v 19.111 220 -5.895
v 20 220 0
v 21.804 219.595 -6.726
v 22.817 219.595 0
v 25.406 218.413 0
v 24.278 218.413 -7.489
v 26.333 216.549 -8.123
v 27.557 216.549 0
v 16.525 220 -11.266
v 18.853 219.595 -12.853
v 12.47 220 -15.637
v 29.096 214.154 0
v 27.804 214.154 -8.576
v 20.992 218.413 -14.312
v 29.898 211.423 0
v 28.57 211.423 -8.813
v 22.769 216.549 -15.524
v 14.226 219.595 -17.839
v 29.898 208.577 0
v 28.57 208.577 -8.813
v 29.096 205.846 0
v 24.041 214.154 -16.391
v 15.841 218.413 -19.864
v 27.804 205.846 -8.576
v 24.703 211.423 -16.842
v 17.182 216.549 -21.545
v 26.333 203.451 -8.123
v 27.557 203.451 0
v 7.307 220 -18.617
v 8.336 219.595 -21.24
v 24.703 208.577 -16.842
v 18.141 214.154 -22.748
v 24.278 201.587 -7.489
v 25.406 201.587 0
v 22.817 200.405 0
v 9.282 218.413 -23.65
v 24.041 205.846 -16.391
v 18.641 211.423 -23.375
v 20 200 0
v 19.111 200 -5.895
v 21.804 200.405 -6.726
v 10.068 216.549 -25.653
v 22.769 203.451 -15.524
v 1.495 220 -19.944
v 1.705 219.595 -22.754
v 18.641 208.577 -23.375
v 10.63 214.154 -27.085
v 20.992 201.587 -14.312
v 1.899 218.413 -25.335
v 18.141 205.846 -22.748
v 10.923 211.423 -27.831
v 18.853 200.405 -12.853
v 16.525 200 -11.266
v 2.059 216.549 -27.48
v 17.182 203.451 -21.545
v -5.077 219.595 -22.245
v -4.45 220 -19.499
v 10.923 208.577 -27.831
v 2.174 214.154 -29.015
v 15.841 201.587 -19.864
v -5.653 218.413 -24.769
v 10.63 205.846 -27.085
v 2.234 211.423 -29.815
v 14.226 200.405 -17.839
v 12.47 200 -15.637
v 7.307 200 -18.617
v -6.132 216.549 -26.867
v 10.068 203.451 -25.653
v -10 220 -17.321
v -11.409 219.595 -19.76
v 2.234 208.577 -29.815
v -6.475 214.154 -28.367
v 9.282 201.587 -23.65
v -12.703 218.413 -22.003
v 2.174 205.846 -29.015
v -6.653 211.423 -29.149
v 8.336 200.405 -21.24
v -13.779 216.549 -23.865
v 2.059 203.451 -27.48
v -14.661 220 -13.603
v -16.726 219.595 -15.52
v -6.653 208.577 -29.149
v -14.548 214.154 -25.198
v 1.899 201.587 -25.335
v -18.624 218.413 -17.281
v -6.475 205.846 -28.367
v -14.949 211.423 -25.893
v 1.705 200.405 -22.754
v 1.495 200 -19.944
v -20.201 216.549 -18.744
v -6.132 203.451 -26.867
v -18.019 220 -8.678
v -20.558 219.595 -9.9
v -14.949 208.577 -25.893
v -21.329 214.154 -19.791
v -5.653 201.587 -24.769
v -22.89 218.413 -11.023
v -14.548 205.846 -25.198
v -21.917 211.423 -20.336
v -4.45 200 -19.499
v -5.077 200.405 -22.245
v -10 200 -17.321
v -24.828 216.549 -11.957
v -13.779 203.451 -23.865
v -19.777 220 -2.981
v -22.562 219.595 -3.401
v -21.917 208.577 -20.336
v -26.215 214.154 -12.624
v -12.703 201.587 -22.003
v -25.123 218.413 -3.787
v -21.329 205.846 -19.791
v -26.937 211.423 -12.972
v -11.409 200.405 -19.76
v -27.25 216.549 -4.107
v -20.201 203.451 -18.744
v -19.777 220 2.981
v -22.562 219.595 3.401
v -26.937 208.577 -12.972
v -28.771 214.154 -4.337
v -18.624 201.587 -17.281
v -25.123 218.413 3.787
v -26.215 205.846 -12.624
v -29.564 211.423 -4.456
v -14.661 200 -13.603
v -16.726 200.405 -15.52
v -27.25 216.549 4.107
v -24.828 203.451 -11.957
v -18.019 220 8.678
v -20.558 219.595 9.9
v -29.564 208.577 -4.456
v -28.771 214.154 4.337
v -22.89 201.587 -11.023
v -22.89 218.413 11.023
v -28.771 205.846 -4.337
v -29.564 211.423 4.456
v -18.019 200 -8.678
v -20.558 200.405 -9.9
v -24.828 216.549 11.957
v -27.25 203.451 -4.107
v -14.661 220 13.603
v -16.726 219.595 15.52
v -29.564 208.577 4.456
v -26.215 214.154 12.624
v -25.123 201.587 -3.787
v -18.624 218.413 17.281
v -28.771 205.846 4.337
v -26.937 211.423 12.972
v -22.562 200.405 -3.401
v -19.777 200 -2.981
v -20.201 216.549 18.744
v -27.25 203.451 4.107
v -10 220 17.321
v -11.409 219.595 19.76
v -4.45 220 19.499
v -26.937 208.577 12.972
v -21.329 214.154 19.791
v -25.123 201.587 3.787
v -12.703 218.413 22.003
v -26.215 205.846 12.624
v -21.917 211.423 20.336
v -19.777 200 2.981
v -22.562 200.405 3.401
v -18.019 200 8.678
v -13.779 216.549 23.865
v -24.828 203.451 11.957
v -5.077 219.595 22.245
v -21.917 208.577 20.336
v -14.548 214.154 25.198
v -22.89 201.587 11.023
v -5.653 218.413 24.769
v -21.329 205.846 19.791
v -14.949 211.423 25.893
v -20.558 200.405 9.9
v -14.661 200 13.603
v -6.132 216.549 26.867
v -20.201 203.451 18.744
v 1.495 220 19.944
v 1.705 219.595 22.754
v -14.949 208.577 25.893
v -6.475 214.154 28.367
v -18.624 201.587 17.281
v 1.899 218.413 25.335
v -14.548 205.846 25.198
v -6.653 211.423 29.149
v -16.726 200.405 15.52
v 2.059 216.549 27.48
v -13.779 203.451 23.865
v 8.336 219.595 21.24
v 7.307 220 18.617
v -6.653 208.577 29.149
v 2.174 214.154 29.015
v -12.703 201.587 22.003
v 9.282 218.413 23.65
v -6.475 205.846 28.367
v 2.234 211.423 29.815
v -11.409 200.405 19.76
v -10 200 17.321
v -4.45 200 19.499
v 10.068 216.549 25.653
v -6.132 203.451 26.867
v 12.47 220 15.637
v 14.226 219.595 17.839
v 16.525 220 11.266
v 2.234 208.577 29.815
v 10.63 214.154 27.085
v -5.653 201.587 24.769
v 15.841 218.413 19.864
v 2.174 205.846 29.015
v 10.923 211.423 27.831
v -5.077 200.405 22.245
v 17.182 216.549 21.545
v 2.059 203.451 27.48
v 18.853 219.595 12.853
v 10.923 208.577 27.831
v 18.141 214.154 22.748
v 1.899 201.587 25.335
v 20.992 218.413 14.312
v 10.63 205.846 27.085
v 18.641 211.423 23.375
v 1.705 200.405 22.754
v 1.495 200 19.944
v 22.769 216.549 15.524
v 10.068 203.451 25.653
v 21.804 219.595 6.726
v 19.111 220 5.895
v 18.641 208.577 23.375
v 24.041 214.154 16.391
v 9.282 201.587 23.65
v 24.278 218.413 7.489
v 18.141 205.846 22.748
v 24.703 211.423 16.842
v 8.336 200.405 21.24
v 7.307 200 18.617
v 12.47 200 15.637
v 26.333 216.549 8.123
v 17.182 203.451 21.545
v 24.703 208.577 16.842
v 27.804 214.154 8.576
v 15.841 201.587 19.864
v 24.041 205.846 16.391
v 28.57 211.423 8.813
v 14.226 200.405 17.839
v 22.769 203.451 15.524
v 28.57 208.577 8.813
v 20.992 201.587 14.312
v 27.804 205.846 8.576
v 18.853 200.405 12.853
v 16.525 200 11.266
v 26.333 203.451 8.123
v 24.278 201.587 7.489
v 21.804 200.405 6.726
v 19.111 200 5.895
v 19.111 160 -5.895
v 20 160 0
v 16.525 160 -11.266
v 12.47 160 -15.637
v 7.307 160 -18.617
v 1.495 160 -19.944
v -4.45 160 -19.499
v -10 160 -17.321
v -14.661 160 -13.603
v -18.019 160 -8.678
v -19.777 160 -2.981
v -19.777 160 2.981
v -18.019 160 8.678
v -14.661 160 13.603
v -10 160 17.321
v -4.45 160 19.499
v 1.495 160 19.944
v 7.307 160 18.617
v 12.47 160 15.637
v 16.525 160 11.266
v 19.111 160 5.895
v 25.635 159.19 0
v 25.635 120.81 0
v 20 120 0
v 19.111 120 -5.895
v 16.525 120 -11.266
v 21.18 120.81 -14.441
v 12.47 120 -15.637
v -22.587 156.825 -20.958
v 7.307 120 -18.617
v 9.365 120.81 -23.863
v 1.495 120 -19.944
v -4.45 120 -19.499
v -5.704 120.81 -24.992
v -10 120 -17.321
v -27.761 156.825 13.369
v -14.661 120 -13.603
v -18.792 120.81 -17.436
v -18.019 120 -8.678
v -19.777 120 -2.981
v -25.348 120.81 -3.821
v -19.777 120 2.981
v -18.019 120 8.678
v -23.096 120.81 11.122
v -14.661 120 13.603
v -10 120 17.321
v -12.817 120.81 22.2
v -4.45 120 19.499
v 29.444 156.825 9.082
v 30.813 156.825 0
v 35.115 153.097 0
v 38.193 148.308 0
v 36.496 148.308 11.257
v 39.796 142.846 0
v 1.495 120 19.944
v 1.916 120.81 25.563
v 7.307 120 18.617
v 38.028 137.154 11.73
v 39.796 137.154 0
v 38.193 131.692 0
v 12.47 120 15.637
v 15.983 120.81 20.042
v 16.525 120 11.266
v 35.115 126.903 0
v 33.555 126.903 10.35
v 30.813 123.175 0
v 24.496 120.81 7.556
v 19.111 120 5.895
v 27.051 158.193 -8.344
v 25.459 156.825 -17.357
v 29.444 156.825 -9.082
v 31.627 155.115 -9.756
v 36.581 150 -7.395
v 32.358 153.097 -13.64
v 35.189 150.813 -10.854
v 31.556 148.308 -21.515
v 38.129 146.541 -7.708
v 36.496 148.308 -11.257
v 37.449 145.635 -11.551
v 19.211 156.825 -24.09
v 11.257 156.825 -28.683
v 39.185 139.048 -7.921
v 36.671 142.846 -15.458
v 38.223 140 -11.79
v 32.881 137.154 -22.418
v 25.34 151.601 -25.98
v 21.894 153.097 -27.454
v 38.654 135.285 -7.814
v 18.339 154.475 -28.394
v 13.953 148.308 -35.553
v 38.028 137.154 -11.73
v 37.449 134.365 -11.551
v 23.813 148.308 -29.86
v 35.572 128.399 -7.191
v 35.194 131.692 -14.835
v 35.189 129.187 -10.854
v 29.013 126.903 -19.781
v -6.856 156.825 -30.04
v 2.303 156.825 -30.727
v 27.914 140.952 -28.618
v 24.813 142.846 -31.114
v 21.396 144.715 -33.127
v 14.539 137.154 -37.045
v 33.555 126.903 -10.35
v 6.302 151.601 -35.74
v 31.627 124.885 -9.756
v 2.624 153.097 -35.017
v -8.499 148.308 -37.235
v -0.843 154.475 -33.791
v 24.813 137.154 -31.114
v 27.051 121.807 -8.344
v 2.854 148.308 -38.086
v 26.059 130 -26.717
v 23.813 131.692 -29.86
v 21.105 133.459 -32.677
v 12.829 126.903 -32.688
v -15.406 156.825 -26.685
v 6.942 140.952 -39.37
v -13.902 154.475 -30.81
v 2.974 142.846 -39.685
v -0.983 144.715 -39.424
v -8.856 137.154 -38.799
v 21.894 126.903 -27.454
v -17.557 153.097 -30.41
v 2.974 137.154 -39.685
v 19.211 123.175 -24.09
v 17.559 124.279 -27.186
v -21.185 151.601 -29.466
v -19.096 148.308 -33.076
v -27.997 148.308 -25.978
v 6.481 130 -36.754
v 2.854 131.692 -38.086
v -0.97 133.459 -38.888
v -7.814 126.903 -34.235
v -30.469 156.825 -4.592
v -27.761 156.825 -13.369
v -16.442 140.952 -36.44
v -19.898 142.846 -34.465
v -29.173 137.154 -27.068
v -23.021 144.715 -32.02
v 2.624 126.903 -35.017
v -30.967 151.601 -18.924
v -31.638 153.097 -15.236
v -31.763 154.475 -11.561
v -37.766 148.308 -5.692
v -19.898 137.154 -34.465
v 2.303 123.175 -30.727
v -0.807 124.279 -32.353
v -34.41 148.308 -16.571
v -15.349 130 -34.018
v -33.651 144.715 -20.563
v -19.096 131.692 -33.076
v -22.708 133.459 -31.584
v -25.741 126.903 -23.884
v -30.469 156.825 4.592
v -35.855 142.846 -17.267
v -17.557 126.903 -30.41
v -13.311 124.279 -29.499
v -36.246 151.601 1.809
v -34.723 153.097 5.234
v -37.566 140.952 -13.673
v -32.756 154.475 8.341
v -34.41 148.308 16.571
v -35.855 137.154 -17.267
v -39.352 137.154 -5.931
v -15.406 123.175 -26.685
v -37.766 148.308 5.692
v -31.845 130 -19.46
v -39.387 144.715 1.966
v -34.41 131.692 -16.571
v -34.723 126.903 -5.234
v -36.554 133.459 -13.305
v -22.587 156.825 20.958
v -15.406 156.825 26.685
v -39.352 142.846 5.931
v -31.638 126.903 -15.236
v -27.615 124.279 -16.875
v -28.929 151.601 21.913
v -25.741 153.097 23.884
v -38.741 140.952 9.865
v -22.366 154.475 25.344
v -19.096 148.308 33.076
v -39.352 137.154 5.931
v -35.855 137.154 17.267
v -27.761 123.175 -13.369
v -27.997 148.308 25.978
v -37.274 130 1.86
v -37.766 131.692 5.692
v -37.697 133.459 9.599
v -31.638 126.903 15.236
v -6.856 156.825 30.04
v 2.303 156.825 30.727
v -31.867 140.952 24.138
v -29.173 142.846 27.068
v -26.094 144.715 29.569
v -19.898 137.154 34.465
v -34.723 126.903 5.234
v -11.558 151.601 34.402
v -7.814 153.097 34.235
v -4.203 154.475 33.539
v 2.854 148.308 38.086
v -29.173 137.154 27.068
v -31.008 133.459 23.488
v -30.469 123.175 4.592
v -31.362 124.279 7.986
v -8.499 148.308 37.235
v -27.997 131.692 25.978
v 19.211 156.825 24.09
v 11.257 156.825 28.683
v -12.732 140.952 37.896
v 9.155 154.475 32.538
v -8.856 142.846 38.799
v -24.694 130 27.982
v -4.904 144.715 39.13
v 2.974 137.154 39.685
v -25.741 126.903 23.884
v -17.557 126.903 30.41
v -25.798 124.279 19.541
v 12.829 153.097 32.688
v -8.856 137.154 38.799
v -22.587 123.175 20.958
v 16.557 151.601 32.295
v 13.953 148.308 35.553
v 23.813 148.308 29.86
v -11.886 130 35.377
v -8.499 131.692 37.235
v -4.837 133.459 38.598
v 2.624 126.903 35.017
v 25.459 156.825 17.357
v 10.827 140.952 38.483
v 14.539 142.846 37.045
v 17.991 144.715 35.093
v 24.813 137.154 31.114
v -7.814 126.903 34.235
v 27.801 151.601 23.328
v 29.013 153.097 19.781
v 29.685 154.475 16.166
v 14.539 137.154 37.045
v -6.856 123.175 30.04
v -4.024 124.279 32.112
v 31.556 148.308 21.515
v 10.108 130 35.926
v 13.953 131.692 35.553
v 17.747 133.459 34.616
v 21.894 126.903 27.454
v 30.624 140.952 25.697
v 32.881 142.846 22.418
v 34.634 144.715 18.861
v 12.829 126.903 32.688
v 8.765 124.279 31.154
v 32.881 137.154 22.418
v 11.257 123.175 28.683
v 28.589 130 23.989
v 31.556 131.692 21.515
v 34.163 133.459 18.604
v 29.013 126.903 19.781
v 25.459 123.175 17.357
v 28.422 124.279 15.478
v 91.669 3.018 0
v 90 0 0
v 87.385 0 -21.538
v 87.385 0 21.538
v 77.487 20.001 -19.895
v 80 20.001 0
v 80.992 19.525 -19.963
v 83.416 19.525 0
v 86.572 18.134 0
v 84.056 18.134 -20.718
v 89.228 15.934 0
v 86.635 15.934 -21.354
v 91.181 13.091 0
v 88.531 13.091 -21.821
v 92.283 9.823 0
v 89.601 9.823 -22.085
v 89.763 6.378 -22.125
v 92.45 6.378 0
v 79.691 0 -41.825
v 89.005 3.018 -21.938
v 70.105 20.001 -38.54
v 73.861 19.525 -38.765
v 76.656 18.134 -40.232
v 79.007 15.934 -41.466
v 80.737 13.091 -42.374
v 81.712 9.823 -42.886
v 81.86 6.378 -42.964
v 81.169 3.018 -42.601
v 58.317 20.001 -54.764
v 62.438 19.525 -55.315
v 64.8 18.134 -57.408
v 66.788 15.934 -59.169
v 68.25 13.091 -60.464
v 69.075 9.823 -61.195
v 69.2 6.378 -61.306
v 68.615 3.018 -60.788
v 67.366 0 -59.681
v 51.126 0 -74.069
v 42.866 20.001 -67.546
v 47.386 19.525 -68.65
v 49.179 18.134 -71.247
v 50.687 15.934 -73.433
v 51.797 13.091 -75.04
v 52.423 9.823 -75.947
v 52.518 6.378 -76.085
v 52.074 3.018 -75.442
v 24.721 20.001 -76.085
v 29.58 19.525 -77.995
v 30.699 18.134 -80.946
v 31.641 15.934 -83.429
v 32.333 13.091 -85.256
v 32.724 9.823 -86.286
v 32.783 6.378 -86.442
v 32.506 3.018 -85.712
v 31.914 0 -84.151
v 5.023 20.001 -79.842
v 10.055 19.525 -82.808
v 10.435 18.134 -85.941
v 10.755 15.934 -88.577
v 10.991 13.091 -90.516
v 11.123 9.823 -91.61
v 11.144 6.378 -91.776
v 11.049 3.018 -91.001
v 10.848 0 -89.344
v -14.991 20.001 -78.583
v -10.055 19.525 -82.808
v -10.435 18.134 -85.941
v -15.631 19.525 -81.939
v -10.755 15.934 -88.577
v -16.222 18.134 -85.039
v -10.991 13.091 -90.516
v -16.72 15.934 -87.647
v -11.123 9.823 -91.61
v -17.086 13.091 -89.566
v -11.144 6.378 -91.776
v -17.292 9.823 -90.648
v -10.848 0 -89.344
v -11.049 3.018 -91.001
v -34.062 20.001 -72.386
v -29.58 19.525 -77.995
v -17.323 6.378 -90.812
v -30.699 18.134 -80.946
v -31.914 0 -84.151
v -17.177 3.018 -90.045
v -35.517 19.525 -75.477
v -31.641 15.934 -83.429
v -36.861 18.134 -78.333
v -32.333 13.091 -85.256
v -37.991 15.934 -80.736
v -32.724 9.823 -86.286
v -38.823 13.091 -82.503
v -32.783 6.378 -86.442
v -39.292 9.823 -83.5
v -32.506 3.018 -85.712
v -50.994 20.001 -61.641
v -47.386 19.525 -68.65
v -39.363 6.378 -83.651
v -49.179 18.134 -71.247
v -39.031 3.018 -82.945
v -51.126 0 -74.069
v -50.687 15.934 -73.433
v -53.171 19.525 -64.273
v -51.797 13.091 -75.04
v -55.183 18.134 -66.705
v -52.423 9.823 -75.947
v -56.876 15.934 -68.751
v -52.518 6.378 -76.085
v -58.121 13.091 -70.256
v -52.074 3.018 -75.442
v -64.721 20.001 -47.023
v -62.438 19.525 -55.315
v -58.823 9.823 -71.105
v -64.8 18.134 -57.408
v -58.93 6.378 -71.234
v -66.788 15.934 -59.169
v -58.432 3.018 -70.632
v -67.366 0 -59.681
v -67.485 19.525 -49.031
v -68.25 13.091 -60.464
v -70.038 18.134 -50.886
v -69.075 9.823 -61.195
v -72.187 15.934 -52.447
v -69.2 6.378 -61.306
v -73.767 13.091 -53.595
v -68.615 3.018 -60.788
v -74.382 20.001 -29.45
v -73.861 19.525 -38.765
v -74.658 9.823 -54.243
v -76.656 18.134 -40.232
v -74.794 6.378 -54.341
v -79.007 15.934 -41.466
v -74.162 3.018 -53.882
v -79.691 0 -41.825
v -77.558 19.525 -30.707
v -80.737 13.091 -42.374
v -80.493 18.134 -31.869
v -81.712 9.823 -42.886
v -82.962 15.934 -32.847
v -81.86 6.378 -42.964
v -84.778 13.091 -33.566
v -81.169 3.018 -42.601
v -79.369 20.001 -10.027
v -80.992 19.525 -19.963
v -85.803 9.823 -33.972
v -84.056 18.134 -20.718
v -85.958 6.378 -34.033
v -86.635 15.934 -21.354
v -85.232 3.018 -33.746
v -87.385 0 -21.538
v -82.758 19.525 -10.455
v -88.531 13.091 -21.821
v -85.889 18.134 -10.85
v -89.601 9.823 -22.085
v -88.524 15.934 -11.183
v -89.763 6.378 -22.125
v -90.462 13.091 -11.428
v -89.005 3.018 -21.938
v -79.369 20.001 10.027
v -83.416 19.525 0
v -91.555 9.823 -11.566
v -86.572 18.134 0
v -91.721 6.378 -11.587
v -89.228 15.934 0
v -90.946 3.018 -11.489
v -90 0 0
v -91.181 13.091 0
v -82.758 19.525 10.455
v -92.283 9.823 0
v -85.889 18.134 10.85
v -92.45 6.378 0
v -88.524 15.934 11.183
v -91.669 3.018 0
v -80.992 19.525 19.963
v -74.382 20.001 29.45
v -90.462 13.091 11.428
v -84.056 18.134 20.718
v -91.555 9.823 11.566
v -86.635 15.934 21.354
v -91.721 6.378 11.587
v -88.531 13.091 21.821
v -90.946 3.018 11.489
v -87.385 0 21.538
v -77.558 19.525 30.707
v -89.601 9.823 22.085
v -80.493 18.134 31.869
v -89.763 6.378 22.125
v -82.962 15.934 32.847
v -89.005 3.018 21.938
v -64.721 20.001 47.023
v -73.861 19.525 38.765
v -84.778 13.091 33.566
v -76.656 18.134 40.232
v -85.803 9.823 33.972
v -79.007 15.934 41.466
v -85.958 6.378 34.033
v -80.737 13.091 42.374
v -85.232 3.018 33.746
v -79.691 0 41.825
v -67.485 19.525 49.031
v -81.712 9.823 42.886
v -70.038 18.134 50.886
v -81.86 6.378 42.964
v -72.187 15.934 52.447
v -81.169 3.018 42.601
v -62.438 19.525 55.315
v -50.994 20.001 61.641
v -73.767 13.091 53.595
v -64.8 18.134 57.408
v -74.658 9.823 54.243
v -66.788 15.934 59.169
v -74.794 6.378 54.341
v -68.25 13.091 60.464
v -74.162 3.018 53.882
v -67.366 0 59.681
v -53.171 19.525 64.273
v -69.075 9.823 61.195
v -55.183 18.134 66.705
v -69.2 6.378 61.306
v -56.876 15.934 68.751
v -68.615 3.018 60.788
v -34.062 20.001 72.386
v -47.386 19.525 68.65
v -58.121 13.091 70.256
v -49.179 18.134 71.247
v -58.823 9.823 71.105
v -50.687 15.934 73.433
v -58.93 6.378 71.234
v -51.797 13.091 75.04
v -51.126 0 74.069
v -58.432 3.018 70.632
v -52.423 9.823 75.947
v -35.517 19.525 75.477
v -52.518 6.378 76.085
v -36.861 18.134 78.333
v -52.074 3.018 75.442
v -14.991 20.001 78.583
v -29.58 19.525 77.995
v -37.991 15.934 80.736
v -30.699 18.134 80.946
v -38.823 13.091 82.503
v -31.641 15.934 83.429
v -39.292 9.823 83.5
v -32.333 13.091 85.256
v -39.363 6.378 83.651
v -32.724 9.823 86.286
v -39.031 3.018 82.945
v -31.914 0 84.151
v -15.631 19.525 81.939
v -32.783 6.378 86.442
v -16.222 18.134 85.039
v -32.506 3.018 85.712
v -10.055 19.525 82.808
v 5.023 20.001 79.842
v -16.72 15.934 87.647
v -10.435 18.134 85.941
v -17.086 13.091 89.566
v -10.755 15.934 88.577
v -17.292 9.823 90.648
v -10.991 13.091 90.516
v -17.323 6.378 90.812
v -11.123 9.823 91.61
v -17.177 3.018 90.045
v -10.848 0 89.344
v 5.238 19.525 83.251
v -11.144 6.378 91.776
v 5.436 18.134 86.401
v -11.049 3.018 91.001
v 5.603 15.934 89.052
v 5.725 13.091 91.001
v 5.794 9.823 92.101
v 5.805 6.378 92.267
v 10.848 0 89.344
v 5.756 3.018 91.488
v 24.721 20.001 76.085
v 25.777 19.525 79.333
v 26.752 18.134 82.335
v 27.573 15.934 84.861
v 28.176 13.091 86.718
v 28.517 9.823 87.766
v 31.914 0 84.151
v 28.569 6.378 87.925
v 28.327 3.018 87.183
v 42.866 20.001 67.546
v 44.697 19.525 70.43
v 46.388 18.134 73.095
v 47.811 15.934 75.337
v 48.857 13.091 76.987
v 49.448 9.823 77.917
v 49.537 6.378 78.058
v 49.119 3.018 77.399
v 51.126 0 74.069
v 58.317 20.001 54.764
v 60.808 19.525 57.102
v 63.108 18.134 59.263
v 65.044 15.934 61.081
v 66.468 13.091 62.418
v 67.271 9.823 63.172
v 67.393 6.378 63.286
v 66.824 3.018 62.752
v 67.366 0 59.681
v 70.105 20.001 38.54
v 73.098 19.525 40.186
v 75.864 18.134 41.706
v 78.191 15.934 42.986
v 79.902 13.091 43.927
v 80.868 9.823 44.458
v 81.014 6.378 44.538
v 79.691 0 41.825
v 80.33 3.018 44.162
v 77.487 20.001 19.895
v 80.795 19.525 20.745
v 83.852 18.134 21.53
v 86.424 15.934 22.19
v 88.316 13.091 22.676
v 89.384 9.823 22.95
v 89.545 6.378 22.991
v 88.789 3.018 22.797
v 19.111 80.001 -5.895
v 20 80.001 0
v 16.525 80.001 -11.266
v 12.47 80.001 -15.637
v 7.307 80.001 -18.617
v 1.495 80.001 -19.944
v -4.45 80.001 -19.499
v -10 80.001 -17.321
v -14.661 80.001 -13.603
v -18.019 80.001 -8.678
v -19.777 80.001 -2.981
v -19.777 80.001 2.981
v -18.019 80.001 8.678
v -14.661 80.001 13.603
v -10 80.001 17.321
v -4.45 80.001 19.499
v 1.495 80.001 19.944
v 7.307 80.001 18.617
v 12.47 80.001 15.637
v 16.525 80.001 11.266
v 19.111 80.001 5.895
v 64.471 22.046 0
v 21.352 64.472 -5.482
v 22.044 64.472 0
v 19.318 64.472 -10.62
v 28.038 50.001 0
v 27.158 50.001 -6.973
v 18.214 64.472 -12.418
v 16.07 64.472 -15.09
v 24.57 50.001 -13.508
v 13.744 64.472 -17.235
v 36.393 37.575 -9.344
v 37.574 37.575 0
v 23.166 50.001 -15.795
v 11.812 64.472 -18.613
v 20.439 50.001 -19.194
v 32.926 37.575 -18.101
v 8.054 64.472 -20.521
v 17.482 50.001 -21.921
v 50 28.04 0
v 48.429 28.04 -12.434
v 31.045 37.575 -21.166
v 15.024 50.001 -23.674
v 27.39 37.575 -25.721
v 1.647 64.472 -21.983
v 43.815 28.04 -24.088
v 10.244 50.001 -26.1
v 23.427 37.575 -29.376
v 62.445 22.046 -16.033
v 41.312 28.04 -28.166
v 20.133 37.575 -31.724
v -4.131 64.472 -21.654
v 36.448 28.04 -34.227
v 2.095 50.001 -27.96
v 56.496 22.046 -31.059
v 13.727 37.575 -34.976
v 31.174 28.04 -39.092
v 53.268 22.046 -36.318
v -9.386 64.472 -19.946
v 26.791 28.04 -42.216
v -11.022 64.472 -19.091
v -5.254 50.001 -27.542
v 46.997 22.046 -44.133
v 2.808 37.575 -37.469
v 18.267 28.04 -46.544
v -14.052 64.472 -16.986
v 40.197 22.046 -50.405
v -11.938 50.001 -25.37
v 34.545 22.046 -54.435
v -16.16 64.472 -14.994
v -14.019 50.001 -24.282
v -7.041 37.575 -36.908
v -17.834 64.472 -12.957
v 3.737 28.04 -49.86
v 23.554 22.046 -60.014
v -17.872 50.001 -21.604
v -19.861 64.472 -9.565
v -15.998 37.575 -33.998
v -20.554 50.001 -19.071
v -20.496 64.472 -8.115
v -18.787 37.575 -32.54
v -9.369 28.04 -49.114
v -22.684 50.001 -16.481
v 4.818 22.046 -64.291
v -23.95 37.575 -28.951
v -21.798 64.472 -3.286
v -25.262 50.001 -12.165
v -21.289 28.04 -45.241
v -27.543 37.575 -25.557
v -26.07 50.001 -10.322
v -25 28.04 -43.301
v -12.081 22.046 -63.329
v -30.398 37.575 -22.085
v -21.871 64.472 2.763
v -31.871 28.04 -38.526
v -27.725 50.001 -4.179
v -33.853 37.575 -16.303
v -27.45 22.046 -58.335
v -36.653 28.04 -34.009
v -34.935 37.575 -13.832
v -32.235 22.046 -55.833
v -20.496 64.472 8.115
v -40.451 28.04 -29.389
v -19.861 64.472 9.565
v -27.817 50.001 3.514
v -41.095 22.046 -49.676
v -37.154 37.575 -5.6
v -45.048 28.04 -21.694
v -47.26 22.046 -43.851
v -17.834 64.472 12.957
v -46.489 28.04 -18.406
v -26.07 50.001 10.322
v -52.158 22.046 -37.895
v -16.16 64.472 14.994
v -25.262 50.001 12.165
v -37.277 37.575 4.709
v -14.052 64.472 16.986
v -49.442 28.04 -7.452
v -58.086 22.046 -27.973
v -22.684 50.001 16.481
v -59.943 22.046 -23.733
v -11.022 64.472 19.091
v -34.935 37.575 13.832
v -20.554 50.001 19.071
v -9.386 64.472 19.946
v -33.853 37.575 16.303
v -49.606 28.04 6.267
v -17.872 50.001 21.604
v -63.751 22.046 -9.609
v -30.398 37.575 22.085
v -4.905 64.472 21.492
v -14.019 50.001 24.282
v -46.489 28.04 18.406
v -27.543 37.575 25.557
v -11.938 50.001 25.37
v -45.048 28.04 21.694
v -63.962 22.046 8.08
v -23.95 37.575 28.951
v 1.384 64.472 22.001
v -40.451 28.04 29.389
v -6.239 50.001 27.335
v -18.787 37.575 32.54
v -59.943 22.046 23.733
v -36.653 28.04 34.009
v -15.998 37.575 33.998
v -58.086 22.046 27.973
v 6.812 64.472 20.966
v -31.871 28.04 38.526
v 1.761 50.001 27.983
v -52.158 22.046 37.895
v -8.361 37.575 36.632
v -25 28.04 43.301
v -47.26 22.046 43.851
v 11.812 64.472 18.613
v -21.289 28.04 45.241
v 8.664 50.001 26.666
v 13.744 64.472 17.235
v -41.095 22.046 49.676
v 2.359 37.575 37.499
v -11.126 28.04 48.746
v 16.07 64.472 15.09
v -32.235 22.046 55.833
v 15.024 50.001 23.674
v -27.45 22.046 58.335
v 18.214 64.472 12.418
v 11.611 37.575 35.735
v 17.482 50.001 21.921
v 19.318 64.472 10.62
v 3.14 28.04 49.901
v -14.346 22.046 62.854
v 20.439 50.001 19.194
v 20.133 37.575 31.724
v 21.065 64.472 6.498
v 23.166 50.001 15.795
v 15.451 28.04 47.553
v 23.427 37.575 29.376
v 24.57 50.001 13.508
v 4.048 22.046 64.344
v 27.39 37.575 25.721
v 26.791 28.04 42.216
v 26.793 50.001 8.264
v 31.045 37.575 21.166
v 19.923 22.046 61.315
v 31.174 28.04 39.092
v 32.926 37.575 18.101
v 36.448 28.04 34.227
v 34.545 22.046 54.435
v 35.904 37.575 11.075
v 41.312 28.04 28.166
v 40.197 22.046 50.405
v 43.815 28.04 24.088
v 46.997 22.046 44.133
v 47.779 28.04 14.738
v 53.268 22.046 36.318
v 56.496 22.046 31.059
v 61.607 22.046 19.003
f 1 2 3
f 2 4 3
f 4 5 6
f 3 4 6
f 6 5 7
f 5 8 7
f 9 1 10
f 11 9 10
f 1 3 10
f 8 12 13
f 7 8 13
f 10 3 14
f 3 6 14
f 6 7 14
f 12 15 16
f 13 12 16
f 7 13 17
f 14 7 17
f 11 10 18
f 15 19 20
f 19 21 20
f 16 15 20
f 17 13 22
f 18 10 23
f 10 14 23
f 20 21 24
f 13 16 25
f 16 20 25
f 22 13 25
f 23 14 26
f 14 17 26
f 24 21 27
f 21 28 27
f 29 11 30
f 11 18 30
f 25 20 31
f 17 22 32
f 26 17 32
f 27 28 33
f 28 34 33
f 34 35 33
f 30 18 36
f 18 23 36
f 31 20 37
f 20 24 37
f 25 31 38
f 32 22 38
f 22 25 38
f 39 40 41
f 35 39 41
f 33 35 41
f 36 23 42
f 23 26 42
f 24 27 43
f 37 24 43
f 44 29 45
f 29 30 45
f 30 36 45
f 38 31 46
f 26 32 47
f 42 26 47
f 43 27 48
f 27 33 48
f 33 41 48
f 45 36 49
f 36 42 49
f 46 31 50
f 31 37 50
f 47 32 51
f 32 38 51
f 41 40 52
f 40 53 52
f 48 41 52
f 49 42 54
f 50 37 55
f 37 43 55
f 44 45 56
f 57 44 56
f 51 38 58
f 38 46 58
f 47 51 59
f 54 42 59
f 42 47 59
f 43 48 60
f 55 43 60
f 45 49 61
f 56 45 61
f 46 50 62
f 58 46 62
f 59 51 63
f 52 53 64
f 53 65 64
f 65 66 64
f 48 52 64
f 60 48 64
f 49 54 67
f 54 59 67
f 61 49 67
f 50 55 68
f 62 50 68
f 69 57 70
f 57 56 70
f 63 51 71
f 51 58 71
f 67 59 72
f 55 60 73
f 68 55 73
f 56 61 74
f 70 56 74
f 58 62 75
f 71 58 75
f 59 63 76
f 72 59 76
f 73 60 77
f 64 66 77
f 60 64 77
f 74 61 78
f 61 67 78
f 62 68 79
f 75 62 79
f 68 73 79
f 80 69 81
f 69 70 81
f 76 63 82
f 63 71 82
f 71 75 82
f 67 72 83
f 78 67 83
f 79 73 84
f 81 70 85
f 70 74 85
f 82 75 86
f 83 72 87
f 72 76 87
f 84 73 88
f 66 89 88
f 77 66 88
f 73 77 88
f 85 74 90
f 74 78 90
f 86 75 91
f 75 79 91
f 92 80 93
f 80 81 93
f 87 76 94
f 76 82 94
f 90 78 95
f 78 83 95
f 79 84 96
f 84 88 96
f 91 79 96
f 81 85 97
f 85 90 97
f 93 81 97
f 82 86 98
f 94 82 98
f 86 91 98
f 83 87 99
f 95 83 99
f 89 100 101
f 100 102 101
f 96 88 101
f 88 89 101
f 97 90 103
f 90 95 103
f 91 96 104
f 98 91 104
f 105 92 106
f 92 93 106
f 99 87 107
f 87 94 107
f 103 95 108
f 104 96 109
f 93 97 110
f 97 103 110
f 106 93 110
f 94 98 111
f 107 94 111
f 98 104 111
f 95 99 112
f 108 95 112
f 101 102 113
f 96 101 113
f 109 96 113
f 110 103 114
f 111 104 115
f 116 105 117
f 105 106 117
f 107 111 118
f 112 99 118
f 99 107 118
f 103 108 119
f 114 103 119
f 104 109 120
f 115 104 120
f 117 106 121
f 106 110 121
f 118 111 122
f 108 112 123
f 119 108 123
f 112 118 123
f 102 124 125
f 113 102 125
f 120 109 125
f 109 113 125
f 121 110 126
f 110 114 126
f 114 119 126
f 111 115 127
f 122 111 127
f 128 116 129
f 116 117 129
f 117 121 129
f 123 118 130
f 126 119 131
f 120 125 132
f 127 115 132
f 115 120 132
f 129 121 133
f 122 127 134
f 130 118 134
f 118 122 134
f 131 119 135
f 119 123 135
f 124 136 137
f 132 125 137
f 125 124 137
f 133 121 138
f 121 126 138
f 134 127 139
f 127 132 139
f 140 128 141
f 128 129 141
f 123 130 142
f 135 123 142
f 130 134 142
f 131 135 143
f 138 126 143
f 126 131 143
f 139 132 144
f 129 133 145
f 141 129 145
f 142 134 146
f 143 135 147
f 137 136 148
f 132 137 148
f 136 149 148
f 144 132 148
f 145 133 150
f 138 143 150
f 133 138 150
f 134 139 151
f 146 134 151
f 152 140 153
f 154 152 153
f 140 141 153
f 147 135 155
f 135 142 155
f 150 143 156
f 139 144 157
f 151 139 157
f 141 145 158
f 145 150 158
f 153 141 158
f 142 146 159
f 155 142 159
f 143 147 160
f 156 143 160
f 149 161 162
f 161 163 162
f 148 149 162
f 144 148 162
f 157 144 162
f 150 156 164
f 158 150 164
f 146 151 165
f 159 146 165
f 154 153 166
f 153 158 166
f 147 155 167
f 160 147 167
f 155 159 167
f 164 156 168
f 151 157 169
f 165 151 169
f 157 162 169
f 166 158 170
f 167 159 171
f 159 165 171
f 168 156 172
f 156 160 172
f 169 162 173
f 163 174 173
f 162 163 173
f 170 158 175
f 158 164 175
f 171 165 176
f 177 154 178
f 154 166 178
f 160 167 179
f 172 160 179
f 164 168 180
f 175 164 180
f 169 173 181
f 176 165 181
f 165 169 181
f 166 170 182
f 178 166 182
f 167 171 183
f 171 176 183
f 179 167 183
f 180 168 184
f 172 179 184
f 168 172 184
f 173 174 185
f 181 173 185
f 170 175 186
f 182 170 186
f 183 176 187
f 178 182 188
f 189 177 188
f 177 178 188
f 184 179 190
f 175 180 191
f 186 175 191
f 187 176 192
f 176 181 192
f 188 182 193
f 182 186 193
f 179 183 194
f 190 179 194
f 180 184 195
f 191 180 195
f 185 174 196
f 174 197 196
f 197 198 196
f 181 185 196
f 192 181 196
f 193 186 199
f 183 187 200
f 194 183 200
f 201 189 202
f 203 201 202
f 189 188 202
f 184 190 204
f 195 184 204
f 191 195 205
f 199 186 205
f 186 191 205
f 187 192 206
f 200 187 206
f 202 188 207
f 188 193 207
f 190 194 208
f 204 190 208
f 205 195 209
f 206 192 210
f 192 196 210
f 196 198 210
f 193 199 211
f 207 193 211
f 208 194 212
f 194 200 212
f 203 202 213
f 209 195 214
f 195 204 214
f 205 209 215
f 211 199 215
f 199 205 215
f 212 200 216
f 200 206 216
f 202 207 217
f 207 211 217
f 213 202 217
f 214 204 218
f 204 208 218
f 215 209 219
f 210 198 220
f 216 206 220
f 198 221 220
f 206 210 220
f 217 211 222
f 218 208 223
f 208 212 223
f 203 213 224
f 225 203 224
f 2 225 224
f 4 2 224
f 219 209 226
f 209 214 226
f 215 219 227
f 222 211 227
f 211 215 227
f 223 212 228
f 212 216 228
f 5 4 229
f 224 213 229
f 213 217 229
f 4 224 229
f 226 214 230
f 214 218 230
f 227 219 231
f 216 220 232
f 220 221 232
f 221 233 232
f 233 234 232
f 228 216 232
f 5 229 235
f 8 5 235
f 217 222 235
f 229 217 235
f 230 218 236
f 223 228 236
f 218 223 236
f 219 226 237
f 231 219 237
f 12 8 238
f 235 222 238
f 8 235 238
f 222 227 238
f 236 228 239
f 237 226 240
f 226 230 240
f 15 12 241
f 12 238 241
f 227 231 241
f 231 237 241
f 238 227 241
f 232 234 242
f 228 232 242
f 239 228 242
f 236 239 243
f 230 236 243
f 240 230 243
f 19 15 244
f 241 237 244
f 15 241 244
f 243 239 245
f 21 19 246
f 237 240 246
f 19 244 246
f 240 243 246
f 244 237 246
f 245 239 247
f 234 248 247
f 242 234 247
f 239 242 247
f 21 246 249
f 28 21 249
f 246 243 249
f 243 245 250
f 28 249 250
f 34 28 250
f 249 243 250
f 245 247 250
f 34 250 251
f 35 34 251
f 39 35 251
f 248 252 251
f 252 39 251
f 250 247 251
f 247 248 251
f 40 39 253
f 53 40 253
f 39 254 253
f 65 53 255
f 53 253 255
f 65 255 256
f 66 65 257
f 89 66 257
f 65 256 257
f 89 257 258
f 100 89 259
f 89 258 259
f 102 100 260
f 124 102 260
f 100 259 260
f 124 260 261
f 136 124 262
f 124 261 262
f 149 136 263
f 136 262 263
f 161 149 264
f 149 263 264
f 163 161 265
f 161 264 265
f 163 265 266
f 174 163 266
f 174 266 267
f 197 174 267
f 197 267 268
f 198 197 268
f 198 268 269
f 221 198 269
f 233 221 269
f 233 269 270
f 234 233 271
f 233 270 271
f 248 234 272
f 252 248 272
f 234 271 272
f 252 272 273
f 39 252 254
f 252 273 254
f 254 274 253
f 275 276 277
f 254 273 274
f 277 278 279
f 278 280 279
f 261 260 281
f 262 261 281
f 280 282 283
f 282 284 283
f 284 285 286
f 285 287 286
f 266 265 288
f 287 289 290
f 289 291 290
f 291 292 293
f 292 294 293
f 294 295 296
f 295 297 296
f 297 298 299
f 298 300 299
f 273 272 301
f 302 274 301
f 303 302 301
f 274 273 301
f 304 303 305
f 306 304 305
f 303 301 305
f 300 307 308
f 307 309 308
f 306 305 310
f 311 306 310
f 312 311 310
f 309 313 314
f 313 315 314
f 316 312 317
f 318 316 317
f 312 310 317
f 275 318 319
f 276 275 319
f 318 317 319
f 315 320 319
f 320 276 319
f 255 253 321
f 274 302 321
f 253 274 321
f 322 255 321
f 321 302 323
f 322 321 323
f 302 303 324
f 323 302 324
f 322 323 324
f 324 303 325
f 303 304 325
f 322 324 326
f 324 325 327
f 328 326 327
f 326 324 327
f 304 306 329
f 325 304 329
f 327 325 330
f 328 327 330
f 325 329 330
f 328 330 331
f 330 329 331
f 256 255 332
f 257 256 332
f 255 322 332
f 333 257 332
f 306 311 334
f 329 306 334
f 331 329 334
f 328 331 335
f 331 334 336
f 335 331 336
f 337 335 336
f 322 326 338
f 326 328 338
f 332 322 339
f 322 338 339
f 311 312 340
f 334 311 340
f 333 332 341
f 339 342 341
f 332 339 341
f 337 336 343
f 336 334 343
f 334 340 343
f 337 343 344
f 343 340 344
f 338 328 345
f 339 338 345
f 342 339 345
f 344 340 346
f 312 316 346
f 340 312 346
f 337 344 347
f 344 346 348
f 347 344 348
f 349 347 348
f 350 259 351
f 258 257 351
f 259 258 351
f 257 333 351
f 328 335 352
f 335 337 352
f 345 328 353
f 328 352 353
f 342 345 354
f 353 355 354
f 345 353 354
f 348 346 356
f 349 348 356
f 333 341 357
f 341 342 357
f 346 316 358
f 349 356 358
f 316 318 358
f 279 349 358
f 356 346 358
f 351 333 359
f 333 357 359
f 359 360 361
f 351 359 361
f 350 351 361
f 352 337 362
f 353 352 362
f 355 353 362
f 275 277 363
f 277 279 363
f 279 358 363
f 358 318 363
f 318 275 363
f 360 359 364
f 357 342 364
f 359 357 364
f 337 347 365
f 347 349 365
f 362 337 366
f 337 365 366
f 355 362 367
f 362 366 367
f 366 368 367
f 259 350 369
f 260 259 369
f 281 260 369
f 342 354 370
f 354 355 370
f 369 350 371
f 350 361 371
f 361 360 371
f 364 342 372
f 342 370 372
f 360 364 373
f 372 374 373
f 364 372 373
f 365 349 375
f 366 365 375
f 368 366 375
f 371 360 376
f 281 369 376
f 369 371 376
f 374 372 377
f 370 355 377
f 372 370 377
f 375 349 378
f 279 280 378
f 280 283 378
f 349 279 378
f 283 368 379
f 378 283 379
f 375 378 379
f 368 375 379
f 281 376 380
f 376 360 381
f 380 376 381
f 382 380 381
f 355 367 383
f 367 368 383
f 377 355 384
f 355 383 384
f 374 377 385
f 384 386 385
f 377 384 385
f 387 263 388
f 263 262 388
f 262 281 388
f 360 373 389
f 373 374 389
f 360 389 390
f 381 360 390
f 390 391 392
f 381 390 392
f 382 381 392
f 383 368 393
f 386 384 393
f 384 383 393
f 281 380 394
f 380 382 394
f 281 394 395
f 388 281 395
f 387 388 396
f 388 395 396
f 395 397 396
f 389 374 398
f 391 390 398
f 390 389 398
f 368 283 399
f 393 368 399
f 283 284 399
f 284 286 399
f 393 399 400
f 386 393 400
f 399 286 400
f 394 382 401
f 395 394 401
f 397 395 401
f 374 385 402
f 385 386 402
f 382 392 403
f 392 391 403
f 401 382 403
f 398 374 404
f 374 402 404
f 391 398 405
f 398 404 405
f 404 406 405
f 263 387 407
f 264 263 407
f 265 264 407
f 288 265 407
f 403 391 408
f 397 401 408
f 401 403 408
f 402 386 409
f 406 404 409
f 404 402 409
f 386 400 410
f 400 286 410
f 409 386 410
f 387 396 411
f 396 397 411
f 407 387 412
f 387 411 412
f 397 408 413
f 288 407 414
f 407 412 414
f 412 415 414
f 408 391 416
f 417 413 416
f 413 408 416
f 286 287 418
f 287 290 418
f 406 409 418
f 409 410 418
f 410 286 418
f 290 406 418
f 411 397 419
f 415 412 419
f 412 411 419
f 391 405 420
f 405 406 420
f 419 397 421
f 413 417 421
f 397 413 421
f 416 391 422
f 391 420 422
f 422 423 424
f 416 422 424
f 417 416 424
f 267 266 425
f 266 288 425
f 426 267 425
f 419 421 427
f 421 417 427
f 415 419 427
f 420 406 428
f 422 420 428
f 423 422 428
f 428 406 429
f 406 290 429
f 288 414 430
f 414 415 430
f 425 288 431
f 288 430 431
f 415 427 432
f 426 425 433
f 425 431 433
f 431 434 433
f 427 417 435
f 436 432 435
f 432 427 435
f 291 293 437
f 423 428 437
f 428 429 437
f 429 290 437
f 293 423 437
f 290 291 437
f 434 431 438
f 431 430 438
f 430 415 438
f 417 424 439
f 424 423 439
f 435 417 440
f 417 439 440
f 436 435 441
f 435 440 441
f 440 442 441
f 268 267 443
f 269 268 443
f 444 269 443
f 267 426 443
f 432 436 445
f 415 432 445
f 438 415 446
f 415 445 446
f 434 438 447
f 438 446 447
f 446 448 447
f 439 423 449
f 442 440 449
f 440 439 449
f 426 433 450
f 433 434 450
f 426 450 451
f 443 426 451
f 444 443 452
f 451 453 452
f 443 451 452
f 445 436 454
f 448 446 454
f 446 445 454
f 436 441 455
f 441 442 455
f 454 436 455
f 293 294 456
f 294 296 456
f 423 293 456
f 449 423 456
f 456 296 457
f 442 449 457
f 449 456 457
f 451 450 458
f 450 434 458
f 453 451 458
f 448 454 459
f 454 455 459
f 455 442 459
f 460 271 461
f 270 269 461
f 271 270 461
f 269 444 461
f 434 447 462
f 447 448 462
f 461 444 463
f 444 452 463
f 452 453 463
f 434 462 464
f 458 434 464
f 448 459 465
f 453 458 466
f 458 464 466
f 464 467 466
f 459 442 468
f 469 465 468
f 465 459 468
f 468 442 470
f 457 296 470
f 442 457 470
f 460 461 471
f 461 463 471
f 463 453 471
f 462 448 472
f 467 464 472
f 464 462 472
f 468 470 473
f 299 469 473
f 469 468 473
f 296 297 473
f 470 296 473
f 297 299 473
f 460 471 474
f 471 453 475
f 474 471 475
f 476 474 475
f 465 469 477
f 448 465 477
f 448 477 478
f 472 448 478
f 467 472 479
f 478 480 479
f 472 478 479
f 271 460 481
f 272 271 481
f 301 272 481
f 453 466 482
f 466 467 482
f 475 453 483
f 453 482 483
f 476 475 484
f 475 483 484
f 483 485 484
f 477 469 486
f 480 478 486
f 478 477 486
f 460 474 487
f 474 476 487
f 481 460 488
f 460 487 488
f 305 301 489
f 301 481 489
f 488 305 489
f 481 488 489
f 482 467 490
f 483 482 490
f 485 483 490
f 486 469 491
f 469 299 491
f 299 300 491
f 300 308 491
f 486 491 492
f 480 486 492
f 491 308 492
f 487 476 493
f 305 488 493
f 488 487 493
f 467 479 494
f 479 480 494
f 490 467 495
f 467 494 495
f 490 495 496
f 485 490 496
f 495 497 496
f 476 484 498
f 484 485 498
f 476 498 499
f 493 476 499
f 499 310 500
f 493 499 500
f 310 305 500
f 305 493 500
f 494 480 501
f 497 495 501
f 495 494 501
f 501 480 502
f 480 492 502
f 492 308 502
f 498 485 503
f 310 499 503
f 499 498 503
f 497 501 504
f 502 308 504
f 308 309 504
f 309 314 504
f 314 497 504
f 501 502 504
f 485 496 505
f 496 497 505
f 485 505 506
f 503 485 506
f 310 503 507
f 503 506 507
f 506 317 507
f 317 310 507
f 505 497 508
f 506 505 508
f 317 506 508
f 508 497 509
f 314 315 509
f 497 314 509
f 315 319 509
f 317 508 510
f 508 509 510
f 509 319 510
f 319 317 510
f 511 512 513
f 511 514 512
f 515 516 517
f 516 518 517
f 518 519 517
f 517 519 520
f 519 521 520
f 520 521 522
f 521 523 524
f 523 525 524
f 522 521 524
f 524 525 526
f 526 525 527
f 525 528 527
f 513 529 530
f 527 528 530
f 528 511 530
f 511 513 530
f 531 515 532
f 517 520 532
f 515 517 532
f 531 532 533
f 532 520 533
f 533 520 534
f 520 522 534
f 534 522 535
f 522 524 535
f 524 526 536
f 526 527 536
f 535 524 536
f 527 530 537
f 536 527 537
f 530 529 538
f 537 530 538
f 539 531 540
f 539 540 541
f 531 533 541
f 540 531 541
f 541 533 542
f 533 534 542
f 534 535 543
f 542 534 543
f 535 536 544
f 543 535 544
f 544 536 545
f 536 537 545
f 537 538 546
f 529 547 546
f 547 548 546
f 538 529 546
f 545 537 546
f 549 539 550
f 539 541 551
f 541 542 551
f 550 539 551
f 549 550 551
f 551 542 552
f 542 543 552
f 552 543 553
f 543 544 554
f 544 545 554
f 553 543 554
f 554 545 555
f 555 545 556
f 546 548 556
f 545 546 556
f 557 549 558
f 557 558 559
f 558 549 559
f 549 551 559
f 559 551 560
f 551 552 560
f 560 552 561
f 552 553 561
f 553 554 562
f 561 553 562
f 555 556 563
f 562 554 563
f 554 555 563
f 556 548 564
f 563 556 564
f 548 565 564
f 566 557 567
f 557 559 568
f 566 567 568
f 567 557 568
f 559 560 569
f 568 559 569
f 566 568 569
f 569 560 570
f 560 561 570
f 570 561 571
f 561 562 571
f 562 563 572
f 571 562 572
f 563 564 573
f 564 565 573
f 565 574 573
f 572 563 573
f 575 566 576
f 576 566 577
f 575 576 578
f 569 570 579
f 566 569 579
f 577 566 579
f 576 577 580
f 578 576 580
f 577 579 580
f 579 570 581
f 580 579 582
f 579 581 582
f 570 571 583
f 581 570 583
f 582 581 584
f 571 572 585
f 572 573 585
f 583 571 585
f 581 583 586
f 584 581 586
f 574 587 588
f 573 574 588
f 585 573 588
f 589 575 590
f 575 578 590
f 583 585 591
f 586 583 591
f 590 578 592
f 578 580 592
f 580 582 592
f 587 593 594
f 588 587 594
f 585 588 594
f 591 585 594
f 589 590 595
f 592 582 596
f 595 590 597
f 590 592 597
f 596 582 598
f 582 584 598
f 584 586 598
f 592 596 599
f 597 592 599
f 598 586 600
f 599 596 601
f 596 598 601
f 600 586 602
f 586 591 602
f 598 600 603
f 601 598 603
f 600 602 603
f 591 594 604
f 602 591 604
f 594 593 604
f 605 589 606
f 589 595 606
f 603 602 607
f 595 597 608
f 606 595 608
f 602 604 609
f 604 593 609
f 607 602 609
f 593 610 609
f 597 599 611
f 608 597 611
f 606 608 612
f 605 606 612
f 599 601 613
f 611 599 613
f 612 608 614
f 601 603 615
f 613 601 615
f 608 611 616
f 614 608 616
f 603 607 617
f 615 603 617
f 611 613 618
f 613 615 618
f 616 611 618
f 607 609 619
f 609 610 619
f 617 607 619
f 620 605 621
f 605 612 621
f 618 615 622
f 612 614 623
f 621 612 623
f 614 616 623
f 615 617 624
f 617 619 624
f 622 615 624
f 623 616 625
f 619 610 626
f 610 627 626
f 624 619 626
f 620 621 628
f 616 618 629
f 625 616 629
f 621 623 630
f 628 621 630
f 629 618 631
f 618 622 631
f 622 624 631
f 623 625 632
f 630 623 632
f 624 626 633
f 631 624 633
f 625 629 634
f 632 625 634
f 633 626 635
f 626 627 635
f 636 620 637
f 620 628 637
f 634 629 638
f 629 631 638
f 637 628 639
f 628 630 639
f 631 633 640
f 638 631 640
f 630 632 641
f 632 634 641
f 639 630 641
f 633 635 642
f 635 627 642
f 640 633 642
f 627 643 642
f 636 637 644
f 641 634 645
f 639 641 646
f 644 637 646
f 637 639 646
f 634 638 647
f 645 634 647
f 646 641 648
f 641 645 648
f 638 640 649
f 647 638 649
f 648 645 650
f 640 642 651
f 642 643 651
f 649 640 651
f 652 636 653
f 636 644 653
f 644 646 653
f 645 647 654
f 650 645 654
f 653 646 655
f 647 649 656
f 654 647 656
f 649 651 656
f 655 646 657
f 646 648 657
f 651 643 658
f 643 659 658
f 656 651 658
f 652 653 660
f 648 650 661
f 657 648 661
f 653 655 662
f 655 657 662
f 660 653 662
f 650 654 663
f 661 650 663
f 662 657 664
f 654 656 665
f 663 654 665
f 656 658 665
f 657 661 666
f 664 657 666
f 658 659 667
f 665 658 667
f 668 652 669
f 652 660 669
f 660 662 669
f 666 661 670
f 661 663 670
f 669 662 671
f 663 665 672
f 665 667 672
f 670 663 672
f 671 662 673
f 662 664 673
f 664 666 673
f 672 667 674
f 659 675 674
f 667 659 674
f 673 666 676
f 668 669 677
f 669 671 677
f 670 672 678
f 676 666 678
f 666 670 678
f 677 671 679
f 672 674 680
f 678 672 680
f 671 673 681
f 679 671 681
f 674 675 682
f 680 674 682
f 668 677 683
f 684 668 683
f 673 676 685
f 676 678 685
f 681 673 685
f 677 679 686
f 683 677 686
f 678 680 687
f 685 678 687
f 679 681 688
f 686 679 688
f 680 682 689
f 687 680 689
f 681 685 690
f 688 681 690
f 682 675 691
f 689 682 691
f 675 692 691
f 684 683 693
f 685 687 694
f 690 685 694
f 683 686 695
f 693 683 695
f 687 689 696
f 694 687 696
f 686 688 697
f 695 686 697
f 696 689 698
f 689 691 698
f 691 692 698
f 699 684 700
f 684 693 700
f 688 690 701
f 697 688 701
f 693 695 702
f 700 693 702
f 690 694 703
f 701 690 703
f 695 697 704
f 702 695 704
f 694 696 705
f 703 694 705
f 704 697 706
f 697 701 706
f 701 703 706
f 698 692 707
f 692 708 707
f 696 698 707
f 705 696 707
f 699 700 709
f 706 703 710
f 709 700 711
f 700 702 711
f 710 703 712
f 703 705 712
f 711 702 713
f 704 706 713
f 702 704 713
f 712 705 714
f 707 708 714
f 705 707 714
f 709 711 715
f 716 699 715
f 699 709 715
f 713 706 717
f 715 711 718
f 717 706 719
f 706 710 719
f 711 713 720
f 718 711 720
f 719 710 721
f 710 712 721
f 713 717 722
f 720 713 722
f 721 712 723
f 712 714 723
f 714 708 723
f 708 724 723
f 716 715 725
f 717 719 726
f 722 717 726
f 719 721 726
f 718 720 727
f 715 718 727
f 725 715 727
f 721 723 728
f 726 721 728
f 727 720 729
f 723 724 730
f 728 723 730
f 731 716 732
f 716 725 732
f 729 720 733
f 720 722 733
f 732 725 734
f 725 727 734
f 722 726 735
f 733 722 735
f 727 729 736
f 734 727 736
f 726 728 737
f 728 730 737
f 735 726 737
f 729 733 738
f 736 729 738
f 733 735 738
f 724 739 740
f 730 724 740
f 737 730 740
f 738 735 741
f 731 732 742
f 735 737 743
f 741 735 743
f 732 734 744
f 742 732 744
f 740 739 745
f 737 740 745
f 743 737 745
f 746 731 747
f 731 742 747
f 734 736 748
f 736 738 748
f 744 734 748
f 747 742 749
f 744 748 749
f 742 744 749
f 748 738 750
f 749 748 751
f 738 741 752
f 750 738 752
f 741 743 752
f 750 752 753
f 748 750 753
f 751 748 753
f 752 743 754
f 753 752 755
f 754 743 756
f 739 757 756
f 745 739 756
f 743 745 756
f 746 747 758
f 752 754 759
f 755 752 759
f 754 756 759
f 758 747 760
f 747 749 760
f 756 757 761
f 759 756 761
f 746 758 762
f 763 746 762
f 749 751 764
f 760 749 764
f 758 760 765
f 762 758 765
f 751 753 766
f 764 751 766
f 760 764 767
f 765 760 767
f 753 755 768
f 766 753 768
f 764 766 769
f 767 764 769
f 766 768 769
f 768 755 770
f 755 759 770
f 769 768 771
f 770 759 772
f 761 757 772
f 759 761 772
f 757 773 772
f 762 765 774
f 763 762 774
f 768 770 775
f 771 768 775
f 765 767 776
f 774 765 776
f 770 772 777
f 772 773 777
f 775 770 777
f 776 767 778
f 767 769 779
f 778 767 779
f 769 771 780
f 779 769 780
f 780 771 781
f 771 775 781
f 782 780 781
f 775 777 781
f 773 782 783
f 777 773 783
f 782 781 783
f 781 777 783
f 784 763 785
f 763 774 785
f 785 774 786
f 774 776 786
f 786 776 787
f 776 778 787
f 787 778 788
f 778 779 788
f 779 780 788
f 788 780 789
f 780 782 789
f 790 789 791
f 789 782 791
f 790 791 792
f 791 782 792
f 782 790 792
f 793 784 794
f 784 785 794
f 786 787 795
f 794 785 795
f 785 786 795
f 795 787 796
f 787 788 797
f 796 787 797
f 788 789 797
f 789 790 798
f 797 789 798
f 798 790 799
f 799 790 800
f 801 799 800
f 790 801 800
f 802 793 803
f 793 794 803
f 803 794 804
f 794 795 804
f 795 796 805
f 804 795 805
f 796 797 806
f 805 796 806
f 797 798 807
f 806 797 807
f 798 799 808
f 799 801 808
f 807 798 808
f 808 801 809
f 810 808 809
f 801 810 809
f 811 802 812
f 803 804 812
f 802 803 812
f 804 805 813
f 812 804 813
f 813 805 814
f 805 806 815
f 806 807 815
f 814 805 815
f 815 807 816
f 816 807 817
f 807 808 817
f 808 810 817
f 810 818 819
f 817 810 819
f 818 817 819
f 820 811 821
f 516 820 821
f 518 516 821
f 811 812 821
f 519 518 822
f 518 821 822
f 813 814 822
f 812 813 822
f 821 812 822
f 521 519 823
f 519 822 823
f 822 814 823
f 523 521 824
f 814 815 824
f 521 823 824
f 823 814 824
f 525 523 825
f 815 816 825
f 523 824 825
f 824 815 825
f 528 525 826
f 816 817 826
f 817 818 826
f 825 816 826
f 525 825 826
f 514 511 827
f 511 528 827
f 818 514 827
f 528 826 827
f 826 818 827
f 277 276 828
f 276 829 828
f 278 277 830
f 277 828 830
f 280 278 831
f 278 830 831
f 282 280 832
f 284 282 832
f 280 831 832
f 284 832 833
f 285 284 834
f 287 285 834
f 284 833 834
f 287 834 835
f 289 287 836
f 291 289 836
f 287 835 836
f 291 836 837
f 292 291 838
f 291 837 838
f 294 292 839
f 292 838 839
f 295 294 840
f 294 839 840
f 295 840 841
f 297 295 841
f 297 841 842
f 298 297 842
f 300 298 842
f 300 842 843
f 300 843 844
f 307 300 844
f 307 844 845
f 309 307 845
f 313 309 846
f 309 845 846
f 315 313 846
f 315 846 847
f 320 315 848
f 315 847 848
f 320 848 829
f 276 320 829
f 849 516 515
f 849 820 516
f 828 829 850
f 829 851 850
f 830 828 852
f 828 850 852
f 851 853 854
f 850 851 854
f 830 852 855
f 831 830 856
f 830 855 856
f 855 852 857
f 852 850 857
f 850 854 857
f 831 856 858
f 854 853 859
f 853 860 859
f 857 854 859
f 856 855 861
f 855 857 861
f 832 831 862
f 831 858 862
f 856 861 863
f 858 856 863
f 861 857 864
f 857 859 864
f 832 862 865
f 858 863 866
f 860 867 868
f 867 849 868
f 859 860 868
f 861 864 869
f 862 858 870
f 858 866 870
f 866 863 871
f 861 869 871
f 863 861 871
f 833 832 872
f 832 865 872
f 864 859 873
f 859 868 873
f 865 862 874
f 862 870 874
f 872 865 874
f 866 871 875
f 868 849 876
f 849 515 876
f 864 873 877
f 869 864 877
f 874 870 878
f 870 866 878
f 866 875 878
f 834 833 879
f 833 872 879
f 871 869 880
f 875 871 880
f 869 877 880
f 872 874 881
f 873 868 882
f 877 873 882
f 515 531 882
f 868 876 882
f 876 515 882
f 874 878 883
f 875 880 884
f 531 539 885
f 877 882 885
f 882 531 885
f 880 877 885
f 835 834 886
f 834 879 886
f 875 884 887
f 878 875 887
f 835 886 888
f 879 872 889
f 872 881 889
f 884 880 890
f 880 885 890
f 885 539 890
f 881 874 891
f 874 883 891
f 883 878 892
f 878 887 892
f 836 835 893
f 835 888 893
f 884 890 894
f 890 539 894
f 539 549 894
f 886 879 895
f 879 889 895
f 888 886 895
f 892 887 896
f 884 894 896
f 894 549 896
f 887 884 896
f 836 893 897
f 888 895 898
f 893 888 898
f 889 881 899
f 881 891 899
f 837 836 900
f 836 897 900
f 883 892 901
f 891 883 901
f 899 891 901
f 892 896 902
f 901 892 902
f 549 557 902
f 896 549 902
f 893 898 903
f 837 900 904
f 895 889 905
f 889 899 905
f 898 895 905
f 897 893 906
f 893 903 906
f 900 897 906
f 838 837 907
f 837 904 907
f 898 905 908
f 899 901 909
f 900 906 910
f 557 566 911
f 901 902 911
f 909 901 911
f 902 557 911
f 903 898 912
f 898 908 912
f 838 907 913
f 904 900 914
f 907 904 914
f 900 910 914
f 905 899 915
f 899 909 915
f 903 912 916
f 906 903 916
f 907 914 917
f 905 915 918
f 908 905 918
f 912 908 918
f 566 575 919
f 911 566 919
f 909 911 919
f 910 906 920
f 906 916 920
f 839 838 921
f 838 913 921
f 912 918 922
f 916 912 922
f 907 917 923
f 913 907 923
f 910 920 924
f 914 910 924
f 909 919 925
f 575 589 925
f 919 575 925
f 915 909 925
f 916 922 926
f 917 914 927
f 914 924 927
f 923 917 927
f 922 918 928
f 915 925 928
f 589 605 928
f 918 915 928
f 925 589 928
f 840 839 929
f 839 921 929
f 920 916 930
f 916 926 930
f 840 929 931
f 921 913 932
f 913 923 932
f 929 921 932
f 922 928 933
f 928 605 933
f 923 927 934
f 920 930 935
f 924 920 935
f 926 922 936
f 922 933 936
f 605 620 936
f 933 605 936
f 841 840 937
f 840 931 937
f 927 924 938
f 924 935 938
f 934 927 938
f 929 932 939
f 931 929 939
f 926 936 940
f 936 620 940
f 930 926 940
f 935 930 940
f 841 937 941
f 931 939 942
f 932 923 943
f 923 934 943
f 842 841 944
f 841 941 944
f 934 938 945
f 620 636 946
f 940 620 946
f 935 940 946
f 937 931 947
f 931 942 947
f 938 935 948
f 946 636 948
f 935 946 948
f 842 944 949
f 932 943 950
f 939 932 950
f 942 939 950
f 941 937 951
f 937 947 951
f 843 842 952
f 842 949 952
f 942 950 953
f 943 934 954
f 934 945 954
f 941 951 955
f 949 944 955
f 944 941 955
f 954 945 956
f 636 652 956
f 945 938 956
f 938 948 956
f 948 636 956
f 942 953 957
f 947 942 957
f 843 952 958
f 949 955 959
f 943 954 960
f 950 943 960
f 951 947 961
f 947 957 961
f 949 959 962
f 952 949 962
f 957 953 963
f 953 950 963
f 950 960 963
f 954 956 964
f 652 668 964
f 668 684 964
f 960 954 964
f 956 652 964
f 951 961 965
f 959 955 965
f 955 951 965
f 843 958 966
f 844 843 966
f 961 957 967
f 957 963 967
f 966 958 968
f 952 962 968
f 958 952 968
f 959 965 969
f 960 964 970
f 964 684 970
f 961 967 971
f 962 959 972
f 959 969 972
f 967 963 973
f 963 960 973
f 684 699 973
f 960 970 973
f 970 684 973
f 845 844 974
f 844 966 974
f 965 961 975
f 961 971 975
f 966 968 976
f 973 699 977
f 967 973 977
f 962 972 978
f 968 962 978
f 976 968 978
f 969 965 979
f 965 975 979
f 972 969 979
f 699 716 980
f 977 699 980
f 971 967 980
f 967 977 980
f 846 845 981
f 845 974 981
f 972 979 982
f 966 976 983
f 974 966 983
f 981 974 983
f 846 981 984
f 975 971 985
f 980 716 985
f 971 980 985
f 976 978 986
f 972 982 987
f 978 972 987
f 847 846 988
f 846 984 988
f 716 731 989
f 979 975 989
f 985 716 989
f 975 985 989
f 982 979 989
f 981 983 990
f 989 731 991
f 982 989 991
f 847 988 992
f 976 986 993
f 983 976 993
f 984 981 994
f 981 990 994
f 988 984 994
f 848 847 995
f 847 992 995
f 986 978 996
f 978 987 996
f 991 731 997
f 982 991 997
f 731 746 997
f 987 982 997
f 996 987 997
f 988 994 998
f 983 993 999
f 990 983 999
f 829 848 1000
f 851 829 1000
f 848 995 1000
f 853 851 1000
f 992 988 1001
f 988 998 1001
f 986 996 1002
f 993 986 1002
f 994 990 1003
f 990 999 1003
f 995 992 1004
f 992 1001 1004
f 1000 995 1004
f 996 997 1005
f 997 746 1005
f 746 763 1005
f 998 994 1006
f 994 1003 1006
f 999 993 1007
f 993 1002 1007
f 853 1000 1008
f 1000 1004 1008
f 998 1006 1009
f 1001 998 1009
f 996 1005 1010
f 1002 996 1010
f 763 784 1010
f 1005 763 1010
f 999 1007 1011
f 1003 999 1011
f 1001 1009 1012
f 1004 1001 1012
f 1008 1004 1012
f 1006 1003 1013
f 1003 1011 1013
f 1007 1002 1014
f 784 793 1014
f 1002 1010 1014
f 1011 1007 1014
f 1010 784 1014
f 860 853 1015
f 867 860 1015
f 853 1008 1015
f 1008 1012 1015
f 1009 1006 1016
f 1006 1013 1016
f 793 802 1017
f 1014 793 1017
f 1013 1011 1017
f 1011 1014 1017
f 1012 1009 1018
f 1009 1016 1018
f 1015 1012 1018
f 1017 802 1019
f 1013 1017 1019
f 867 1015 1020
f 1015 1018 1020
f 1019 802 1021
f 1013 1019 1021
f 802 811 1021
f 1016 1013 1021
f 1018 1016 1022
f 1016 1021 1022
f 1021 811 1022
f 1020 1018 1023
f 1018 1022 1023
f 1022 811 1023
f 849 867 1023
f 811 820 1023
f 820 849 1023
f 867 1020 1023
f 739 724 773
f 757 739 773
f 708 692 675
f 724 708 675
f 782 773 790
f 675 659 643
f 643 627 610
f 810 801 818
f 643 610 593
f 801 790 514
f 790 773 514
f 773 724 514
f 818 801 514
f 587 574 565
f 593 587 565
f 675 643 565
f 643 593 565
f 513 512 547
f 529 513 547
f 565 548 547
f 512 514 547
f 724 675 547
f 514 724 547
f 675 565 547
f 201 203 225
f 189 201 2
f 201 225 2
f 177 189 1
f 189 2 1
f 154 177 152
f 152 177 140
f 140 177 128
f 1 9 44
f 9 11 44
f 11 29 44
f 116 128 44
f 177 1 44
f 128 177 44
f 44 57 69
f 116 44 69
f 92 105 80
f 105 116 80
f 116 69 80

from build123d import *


with BuildPart() as part:
    # Sketch1 → Revolve1 (revolve)
    with BuildSketch(Plane.XY):
        with BuildLine():
            Line((0, 0), (0, 220))
            Line((0, 220), (20, 220))
            ThreePointArc((20, 220), (30, 210), (20, 200))
            Line((20, 200), (20, 160))
            ThreePointArc((20, 160), (40, 140), (20, 120))
            Line((20, 120), (20, 80.001263784))
            ThreePointArc((20, 80.001263784), (37.573593129, 37.574856913), (80, 20.001263784))
            ThreePointArc((80, 20.001263784), (91.180905073, 13.090889158), (90, 0))
            Line((90, 0), (0, 0))
        make_face()
    revolve(axis=Axis((0, 220, 0), (0, 1, 0)))


solid = part.part
